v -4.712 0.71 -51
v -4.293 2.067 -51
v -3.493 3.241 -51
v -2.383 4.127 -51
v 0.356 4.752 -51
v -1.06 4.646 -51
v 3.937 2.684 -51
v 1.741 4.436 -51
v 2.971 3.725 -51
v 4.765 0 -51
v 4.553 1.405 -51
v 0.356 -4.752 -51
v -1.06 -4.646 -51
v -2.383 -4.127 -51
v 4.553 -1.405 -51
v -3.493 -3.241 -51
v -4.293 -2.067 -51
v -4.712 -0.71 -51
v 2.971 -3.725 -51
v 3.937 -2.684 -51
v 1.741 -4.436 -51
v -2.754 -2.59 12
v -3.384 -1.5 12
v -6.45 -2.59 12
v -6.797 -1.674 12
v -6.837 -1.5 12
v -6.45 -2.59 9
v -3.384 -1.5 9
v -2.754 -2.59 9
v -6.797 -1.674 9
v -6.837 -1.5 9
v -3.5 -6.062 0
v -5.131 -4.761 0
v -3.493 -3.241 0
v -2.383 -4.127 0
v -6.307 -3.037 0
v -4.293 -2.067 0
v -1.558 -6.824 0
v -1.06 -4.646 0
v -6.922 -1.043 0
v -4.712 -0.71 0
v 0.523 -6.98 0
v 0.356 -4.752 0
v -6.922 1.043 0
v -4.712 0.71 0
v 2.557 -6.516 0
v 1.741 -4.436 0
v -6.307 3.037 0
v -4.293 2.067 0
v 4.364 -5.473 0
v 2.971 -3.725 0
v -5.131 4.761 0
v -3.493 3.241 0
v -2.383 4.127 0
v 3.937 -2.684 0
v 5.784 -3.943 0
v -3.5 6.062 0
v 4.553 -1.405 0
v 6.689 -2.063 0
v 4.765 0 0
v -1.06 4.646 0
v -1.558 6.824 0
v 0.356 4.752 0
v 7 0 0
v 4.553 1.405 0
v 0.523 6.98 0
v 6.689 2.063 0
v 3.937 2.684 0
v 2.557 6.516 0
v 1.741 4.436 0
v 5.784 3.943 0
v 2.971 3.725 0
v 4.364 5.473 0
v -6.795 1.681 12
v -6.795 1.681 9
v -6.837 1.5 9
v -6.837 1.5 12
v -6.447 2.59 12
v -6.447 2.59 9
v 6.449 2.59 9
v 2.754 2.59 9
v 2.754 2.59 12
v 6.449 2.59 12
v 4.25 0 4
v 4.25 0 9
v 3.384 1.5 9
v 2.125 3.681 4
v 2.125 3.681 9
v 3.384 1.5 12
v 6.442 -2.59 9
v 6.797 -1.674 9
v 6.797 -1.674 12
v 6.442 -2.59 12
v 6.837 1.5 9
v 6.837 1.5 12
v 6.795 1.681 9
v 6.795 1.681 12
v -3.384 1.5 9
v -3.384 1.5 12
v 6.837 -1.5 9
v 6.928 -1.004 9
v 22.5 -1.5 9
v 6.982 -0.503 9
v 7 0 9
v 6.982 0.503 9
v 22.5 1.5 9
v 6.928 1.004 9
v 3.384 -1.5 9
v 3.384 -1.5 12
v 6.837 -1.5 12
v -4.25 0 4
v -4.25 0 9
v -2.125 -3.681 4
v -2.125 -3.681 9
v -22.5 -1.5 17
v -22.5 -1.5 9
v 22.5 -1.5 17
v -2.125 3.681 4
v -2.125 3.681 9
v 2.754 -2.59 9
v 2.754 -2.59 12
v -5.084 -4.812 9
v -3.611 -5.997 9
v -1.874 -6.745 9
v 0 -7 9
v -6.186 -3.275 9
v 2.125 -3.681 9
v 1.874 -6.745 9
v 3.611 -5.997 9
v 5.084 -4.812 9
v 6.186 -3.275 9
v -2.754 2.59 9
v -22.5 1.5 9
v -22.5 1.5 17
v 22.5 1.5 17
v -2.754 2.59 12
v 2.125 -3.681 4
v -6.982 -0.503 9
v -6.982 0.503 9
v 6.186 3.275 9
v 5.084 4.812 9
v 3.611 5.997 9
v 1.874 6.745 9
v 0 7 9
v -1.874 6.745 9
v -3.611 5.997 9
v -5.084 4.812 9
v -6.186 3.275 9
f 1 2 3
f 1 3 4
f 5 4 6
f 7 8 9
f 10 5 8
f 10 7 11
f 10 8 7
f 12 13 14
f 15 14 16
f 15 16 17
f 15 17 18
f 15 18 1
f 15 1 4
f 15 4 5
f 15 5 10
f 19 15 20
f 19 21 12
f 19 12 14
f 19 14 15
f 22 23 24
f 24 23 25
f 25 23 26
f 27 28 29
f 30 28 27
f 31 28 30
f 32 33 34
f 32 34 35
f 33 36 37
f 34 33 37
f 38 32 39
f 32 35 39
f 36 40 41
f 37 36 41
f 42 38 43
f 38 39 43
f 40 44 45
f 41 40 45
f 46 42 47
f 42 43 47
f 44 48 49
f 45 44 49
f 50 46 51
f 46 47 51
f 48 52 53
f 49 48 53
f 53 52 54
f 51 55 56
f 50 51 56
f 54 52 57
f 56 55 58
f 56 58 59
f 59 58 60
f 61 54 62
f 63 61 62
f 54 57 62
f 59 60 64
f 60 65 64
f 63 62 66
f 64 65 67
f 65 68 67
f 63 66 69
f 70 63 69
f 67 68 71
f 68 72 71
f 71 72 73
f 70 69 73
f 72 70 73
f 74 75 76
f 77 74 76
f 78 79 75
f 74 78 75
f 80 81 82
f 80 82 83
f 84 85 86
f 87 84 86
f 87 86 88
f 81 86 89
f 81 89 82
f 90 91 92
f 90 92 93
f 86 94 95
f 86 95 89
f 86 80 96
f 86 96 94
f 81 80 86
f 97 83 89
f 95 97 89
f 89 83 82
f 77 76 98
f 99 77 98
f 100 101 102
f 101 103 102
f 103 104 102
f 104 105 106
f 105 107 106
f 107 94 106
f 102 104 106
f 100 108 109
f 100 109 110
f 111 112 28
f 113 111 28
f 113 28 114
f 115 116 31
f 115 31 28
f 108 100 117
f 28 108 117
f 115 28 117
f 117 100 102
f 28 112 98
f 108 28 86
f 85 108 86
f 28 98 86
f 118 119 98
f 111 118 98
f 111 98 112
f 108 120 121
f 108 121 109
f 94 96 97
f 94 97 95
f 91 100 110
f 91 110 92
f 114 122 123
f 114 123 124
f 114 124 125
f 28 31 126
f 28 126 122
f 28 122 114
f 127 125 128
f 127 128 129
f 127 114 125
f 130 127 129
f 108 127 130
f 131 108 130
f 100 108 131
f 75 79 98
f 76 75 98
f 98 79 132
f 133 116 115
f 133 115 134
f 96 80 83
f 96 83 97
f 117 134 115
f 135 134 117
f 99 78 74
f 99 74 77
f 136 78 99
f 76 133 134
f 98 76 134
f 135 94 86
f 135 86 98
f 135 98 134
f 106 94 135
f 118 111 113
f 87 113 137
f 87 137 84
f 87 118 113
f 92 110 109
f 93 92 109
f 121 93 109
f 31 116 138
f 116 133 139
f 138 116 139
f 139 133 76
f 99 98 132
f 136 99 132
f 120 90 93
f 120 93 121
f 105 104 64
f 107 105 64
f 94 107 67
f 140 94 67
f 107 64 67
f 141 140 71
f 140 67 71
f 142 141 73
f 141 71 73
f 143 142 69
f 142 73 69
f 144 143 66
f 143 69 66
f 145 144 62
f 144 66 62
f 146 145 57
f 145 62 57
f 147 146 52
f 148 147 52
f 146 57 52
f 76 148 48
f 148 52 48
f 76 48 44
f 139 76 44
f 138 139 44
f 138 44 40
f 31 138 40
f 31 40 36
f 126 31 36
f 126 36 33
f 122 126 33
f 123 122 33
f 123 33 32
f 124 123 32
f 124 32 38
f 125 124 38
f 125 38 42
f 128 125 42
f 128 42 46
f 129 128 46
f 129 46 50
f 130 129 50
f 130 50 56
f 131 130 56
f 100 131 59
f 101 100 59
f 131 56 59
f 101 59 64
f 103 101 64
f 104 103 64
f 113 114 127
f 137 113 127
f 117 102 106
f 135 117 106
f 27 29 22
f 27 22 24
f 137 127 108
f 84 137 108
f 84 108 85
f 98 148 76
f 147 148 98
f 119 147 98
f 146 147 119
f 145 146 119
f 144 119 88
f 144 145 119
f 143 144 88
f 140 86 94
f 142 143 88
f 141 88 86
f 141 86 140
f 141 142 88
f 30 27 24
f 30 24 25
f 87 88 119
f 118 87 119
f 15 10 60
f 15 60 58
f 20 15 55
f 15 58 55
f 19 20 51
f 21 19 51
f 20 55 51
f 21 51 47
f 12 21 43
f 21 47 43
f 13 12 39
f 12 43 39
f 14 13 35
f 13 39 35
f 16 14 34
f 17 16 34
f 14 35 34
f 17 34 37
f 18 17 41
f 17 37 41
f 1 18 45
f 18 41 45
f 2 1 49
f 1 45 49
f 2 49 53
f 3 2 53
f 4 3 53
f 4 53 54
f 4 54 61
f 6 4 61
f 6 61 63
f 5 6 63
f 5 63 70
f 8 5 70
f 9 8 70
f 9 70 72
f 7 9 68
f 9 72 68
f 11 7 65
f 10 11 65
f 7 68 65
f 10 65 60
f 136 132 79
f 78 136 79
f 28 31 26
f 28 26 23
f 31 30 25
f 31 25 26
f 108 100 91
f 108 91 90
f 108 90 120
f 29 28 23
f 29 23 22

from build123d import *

# Parameters (mm, degrees)
ESBO_O1_R                  = 7
RESSALTO_EXTRUS_O1_DEPTH   = 9
ESBO_O2_R                  = 4.765
RESSALTO_EXTRUS_O2_DEPTH   = 51
CORTE_EXTRUS_O1_DEPTH      = 5
ESBO_O4_W                  = 45
ESBO_O4_H                  = 3
RESSALTO_EXTRUS_O3_DEPTH   = 8
RESSALTO_EXTRUS_O4_DEPTH   = 3
RESSALTO_EXTRUS_O4_2_DEPTH = 3
RESSALTO_EXTRUS_O5_DEPTH   = 3
RESSALTO_EXTRUS_O5_2_DEPTH = 3


with BuildPart() as part:
    # Esboço1 → Ressalto-extrusão1 (new body)
    with BuildSketch(Plane.XY):
        Circle(ESBO_O1_R)
    extrude(amount=RESSALTO_EXTRUS_O1_DEPTH)

    # Esboço2 → Ressalto-extrusão2 (add)
    with BuildSketch(Plane(origin=(0, 0, 0), x_dir=(-1, 0, 0), z_dir=(0, 0, -1))):
        with Locations(Location((0, 0, 0), (0, 0, 180))):
            Circle(ESBO_O2_R)
    extrude(amount=RESSALTO_EXTRUS_O2_DEPTH)

    # Esboço3 → Corte-extrusão1 (cut)
    with BuildSketch(Plane.XY.offset(9)):
        Polygon((4.25, 0), (2.125, 3.680607966), (-2.125, 3.680607966), (-4.25, 0), (-2.125, -3.680607966), (2.125, -3.680607966), align=None)
    extrude(amount=-CORTE_EXTRUS_O1_DEPTH, mode=Mode.SUBTRACT)

    # Esboço4 → Ressalto-extrusão3 (add)
    with BuildSketch(Plane.XY.offset(9)):
        Rectangle(ESBO_O4_W, ESBO_O4_H)
    extrude(amount=RESSALTO_EXTRUS_O3_DEPTH)


with BuildPart() as body_2:
    # Esboço5 → Ressalto-extrusão4 (new body)
    with BuildSketch(Plane.XY.offset(9)):
        Polygon((-6.837397166, -1.5), (-3.383974596, -1.5), (-2.754487298, -2.590303983), (-6.450319069, -2.590303983), (-6.796980481, -1.673635664), align=None)
    extrude(amount=RESSALTO_EXTRUS_O4_DEPTH)


with BuildPart() as body_3:
    # Esboço5 → Ressalto-extrus_o4 2 (new body)
    with BuildSketch(Plane.XY.offset(9)):
        Polygon((2.754487298, -2.590303983), (3.383974596, -1.5), (6.837397166, -1.5), (6.796980481, -1.673635664), (6.441898355, -2.590303983), align=None)
    extrude(amount=RESSALTO_EXTRUS_O4_2_DEPTH)


with BuildPart() as body_4:
    # Esboço7 → Ressalto-extrusão5 (new body)
    with BuildSketch(Plane.XY.offset(9)):
        Polygon((6.837397166, 1.5), (3.383974596, 1.5), (2.754487298, 2.590303983), (6.449322248, 2.590303983), (6.795083403, 1.681321368), align=None)
    extrude(amount=RESSALTO_EXTRUS_O5_DEPTH)


with BuildPart() as body_5:
    # Esboço7 → Ressalto-extrus_o5 2 (new body)
    with BuildSketch(Plane.XY.offset(9)):
        Polygon((-6.837397166, 1.5), (-3.383974596, 1.5), (-2.754487298, 2.590303983), (-6.44720819, 2.590303983), (-6.795083403, 1.681321368), align=None)
    extrude(amount=RESSALTO_EXTRUS_O5_2_DEPTH)


solid = Compound([part.part, body_2.part, body_3.part, body_4.part, body_5.part])
